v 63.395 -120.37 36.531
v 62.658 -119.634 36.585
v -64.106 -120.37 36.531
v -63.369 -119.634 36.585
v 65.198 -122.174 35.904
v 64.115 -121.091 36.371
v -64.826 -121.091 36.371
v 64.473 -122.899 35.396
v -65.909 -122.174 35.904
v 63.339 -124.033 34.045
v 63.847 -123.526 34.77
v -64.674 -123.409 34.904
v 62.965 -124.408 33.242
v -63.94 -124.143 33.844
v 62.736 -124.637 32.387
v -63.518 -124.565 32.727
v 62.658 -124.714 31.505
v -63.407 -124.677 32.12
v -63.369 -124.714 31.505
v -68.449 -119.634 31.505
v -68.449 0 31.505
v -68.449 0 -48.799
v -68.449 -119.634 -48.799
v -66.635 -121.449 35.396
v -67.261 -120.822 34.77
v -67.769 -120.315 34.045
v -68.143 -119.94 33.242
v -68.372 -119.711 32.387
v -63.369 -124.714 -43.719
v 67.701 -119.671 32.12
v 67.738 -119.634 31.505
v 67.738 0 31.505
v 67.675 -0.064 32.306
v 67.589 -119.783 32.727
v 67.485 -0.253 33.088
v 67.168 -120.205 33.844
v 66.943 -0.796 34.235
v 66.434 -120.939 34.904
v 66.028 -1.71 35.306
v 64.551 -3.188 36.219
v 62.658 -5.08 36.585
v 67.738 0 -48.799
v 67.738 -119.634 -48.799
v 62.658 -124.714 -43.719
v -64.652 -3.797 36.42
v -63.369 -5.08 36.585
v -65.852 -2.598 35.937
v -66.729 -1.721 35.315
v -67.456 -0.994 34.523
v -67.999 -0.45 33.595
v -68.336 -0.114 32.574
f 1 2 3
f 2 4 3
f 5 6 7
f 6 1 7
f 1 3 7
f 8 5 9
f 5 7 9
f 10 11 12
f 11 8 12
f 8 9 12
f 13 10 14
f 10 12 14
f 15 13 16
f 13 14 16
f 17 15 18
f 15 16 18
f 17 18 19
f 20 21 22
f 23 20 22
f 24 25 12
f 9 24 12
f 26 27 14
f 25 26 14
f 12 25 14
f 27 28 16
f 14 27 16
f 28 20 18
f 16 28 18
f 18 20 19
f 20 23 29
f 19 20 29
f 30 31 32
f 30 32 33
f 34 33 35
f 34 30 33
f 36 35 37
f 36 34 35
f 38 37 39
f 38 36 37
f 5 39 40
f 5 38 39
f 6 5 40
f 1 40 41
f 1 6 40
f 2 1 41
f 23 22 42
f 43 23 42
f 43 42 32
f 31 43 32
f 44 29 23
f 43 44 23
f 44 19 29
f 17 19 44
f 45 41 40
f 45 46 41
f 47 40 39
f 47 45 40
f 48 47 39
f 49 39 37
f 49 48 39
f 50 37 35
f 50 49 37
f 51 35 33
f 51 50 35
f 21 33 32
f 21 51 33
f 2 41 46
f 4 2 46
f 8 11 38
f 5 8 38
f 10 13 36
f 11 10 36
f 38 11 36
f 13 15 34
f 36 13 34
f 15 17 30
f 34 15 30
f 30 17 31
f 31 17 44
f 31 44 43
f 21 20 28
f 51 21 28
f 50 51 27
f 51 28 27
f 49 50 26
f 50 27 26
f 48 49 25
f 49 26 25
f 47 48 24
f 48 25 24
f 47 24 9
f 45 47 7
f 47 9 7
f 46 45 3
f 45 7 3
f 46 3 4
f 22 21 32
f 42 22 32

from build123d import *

# Parameters (mm, degrees)
F1_DEPTH    = 124.714
F2_R        = 5.08
F3_T1_DEPTH = 106.4324408115
F3_T3_DEPTH = 162.3159941245


# Not quite as in the source:
# - a fillet or chamfer that OpenCascade refuses, or shapes differently, is made with other operations: its cross-section is extruded or revolved along the edge and cut away or added


with BuildPart() as f1:
    # F0 (on Front) → F1 (new body)
    with BuildSketch(Plane.XZ):
        Polygon((-27.0380023867, 36.5847535431), (-68.4493109584, 36.5847535431), (-68.4493109584, -48.7993881106), (67.7383840084, -48.7993881106), (67.7383840084, 36.5847535431), (0, 36.5847535431), align=None)
    extrude(amount=F1_DEPTH)

    # F2
    f2_edges = [f1.edges().sort_by_distance(p)[0] for p in [
        (-68.449311, -62.357, 36.584754),
        (-0.355463, 0, 36.584754),
        (67.738384, -62.357, 36.584754),
        (-0.355463, -124.714, 36.584754),
    ]]
    fillet(f2_edges, radius=F2_R)

    # F3: chamfer of 5.08 on 4 edges, made by hand

    # F3_s2 → F3_t1 (cut)
    with BuildSketch(Plane.XY.offset(-61.8635376895)):
        Polygon((-68.4493109584, -119.634), (-63.3693109584, -124.714), (-68.4493109584, -124.714), align=None)
        Polygon((62.6583840084, -124.714), (67.7383840084, -119.634), (67.7383840084, -124.714), align=None)
    extrude(amount=F3_T1_DEPTH, mode=Mode.SUBTRACT)

    # F3_s4 → F3_t3 (cut)
    with BuildSketch(Plane.YZ.offset(-81.5134605373)):
        Polygon((-124.714, -43.7193881106), (-119.634, -48.7993881106), (-124.714, -48.7993881106), align=None)
    extrude(amount=F3_T3_DEPTH, mode=Mode.SUBTRACT)


solid = f1.part
